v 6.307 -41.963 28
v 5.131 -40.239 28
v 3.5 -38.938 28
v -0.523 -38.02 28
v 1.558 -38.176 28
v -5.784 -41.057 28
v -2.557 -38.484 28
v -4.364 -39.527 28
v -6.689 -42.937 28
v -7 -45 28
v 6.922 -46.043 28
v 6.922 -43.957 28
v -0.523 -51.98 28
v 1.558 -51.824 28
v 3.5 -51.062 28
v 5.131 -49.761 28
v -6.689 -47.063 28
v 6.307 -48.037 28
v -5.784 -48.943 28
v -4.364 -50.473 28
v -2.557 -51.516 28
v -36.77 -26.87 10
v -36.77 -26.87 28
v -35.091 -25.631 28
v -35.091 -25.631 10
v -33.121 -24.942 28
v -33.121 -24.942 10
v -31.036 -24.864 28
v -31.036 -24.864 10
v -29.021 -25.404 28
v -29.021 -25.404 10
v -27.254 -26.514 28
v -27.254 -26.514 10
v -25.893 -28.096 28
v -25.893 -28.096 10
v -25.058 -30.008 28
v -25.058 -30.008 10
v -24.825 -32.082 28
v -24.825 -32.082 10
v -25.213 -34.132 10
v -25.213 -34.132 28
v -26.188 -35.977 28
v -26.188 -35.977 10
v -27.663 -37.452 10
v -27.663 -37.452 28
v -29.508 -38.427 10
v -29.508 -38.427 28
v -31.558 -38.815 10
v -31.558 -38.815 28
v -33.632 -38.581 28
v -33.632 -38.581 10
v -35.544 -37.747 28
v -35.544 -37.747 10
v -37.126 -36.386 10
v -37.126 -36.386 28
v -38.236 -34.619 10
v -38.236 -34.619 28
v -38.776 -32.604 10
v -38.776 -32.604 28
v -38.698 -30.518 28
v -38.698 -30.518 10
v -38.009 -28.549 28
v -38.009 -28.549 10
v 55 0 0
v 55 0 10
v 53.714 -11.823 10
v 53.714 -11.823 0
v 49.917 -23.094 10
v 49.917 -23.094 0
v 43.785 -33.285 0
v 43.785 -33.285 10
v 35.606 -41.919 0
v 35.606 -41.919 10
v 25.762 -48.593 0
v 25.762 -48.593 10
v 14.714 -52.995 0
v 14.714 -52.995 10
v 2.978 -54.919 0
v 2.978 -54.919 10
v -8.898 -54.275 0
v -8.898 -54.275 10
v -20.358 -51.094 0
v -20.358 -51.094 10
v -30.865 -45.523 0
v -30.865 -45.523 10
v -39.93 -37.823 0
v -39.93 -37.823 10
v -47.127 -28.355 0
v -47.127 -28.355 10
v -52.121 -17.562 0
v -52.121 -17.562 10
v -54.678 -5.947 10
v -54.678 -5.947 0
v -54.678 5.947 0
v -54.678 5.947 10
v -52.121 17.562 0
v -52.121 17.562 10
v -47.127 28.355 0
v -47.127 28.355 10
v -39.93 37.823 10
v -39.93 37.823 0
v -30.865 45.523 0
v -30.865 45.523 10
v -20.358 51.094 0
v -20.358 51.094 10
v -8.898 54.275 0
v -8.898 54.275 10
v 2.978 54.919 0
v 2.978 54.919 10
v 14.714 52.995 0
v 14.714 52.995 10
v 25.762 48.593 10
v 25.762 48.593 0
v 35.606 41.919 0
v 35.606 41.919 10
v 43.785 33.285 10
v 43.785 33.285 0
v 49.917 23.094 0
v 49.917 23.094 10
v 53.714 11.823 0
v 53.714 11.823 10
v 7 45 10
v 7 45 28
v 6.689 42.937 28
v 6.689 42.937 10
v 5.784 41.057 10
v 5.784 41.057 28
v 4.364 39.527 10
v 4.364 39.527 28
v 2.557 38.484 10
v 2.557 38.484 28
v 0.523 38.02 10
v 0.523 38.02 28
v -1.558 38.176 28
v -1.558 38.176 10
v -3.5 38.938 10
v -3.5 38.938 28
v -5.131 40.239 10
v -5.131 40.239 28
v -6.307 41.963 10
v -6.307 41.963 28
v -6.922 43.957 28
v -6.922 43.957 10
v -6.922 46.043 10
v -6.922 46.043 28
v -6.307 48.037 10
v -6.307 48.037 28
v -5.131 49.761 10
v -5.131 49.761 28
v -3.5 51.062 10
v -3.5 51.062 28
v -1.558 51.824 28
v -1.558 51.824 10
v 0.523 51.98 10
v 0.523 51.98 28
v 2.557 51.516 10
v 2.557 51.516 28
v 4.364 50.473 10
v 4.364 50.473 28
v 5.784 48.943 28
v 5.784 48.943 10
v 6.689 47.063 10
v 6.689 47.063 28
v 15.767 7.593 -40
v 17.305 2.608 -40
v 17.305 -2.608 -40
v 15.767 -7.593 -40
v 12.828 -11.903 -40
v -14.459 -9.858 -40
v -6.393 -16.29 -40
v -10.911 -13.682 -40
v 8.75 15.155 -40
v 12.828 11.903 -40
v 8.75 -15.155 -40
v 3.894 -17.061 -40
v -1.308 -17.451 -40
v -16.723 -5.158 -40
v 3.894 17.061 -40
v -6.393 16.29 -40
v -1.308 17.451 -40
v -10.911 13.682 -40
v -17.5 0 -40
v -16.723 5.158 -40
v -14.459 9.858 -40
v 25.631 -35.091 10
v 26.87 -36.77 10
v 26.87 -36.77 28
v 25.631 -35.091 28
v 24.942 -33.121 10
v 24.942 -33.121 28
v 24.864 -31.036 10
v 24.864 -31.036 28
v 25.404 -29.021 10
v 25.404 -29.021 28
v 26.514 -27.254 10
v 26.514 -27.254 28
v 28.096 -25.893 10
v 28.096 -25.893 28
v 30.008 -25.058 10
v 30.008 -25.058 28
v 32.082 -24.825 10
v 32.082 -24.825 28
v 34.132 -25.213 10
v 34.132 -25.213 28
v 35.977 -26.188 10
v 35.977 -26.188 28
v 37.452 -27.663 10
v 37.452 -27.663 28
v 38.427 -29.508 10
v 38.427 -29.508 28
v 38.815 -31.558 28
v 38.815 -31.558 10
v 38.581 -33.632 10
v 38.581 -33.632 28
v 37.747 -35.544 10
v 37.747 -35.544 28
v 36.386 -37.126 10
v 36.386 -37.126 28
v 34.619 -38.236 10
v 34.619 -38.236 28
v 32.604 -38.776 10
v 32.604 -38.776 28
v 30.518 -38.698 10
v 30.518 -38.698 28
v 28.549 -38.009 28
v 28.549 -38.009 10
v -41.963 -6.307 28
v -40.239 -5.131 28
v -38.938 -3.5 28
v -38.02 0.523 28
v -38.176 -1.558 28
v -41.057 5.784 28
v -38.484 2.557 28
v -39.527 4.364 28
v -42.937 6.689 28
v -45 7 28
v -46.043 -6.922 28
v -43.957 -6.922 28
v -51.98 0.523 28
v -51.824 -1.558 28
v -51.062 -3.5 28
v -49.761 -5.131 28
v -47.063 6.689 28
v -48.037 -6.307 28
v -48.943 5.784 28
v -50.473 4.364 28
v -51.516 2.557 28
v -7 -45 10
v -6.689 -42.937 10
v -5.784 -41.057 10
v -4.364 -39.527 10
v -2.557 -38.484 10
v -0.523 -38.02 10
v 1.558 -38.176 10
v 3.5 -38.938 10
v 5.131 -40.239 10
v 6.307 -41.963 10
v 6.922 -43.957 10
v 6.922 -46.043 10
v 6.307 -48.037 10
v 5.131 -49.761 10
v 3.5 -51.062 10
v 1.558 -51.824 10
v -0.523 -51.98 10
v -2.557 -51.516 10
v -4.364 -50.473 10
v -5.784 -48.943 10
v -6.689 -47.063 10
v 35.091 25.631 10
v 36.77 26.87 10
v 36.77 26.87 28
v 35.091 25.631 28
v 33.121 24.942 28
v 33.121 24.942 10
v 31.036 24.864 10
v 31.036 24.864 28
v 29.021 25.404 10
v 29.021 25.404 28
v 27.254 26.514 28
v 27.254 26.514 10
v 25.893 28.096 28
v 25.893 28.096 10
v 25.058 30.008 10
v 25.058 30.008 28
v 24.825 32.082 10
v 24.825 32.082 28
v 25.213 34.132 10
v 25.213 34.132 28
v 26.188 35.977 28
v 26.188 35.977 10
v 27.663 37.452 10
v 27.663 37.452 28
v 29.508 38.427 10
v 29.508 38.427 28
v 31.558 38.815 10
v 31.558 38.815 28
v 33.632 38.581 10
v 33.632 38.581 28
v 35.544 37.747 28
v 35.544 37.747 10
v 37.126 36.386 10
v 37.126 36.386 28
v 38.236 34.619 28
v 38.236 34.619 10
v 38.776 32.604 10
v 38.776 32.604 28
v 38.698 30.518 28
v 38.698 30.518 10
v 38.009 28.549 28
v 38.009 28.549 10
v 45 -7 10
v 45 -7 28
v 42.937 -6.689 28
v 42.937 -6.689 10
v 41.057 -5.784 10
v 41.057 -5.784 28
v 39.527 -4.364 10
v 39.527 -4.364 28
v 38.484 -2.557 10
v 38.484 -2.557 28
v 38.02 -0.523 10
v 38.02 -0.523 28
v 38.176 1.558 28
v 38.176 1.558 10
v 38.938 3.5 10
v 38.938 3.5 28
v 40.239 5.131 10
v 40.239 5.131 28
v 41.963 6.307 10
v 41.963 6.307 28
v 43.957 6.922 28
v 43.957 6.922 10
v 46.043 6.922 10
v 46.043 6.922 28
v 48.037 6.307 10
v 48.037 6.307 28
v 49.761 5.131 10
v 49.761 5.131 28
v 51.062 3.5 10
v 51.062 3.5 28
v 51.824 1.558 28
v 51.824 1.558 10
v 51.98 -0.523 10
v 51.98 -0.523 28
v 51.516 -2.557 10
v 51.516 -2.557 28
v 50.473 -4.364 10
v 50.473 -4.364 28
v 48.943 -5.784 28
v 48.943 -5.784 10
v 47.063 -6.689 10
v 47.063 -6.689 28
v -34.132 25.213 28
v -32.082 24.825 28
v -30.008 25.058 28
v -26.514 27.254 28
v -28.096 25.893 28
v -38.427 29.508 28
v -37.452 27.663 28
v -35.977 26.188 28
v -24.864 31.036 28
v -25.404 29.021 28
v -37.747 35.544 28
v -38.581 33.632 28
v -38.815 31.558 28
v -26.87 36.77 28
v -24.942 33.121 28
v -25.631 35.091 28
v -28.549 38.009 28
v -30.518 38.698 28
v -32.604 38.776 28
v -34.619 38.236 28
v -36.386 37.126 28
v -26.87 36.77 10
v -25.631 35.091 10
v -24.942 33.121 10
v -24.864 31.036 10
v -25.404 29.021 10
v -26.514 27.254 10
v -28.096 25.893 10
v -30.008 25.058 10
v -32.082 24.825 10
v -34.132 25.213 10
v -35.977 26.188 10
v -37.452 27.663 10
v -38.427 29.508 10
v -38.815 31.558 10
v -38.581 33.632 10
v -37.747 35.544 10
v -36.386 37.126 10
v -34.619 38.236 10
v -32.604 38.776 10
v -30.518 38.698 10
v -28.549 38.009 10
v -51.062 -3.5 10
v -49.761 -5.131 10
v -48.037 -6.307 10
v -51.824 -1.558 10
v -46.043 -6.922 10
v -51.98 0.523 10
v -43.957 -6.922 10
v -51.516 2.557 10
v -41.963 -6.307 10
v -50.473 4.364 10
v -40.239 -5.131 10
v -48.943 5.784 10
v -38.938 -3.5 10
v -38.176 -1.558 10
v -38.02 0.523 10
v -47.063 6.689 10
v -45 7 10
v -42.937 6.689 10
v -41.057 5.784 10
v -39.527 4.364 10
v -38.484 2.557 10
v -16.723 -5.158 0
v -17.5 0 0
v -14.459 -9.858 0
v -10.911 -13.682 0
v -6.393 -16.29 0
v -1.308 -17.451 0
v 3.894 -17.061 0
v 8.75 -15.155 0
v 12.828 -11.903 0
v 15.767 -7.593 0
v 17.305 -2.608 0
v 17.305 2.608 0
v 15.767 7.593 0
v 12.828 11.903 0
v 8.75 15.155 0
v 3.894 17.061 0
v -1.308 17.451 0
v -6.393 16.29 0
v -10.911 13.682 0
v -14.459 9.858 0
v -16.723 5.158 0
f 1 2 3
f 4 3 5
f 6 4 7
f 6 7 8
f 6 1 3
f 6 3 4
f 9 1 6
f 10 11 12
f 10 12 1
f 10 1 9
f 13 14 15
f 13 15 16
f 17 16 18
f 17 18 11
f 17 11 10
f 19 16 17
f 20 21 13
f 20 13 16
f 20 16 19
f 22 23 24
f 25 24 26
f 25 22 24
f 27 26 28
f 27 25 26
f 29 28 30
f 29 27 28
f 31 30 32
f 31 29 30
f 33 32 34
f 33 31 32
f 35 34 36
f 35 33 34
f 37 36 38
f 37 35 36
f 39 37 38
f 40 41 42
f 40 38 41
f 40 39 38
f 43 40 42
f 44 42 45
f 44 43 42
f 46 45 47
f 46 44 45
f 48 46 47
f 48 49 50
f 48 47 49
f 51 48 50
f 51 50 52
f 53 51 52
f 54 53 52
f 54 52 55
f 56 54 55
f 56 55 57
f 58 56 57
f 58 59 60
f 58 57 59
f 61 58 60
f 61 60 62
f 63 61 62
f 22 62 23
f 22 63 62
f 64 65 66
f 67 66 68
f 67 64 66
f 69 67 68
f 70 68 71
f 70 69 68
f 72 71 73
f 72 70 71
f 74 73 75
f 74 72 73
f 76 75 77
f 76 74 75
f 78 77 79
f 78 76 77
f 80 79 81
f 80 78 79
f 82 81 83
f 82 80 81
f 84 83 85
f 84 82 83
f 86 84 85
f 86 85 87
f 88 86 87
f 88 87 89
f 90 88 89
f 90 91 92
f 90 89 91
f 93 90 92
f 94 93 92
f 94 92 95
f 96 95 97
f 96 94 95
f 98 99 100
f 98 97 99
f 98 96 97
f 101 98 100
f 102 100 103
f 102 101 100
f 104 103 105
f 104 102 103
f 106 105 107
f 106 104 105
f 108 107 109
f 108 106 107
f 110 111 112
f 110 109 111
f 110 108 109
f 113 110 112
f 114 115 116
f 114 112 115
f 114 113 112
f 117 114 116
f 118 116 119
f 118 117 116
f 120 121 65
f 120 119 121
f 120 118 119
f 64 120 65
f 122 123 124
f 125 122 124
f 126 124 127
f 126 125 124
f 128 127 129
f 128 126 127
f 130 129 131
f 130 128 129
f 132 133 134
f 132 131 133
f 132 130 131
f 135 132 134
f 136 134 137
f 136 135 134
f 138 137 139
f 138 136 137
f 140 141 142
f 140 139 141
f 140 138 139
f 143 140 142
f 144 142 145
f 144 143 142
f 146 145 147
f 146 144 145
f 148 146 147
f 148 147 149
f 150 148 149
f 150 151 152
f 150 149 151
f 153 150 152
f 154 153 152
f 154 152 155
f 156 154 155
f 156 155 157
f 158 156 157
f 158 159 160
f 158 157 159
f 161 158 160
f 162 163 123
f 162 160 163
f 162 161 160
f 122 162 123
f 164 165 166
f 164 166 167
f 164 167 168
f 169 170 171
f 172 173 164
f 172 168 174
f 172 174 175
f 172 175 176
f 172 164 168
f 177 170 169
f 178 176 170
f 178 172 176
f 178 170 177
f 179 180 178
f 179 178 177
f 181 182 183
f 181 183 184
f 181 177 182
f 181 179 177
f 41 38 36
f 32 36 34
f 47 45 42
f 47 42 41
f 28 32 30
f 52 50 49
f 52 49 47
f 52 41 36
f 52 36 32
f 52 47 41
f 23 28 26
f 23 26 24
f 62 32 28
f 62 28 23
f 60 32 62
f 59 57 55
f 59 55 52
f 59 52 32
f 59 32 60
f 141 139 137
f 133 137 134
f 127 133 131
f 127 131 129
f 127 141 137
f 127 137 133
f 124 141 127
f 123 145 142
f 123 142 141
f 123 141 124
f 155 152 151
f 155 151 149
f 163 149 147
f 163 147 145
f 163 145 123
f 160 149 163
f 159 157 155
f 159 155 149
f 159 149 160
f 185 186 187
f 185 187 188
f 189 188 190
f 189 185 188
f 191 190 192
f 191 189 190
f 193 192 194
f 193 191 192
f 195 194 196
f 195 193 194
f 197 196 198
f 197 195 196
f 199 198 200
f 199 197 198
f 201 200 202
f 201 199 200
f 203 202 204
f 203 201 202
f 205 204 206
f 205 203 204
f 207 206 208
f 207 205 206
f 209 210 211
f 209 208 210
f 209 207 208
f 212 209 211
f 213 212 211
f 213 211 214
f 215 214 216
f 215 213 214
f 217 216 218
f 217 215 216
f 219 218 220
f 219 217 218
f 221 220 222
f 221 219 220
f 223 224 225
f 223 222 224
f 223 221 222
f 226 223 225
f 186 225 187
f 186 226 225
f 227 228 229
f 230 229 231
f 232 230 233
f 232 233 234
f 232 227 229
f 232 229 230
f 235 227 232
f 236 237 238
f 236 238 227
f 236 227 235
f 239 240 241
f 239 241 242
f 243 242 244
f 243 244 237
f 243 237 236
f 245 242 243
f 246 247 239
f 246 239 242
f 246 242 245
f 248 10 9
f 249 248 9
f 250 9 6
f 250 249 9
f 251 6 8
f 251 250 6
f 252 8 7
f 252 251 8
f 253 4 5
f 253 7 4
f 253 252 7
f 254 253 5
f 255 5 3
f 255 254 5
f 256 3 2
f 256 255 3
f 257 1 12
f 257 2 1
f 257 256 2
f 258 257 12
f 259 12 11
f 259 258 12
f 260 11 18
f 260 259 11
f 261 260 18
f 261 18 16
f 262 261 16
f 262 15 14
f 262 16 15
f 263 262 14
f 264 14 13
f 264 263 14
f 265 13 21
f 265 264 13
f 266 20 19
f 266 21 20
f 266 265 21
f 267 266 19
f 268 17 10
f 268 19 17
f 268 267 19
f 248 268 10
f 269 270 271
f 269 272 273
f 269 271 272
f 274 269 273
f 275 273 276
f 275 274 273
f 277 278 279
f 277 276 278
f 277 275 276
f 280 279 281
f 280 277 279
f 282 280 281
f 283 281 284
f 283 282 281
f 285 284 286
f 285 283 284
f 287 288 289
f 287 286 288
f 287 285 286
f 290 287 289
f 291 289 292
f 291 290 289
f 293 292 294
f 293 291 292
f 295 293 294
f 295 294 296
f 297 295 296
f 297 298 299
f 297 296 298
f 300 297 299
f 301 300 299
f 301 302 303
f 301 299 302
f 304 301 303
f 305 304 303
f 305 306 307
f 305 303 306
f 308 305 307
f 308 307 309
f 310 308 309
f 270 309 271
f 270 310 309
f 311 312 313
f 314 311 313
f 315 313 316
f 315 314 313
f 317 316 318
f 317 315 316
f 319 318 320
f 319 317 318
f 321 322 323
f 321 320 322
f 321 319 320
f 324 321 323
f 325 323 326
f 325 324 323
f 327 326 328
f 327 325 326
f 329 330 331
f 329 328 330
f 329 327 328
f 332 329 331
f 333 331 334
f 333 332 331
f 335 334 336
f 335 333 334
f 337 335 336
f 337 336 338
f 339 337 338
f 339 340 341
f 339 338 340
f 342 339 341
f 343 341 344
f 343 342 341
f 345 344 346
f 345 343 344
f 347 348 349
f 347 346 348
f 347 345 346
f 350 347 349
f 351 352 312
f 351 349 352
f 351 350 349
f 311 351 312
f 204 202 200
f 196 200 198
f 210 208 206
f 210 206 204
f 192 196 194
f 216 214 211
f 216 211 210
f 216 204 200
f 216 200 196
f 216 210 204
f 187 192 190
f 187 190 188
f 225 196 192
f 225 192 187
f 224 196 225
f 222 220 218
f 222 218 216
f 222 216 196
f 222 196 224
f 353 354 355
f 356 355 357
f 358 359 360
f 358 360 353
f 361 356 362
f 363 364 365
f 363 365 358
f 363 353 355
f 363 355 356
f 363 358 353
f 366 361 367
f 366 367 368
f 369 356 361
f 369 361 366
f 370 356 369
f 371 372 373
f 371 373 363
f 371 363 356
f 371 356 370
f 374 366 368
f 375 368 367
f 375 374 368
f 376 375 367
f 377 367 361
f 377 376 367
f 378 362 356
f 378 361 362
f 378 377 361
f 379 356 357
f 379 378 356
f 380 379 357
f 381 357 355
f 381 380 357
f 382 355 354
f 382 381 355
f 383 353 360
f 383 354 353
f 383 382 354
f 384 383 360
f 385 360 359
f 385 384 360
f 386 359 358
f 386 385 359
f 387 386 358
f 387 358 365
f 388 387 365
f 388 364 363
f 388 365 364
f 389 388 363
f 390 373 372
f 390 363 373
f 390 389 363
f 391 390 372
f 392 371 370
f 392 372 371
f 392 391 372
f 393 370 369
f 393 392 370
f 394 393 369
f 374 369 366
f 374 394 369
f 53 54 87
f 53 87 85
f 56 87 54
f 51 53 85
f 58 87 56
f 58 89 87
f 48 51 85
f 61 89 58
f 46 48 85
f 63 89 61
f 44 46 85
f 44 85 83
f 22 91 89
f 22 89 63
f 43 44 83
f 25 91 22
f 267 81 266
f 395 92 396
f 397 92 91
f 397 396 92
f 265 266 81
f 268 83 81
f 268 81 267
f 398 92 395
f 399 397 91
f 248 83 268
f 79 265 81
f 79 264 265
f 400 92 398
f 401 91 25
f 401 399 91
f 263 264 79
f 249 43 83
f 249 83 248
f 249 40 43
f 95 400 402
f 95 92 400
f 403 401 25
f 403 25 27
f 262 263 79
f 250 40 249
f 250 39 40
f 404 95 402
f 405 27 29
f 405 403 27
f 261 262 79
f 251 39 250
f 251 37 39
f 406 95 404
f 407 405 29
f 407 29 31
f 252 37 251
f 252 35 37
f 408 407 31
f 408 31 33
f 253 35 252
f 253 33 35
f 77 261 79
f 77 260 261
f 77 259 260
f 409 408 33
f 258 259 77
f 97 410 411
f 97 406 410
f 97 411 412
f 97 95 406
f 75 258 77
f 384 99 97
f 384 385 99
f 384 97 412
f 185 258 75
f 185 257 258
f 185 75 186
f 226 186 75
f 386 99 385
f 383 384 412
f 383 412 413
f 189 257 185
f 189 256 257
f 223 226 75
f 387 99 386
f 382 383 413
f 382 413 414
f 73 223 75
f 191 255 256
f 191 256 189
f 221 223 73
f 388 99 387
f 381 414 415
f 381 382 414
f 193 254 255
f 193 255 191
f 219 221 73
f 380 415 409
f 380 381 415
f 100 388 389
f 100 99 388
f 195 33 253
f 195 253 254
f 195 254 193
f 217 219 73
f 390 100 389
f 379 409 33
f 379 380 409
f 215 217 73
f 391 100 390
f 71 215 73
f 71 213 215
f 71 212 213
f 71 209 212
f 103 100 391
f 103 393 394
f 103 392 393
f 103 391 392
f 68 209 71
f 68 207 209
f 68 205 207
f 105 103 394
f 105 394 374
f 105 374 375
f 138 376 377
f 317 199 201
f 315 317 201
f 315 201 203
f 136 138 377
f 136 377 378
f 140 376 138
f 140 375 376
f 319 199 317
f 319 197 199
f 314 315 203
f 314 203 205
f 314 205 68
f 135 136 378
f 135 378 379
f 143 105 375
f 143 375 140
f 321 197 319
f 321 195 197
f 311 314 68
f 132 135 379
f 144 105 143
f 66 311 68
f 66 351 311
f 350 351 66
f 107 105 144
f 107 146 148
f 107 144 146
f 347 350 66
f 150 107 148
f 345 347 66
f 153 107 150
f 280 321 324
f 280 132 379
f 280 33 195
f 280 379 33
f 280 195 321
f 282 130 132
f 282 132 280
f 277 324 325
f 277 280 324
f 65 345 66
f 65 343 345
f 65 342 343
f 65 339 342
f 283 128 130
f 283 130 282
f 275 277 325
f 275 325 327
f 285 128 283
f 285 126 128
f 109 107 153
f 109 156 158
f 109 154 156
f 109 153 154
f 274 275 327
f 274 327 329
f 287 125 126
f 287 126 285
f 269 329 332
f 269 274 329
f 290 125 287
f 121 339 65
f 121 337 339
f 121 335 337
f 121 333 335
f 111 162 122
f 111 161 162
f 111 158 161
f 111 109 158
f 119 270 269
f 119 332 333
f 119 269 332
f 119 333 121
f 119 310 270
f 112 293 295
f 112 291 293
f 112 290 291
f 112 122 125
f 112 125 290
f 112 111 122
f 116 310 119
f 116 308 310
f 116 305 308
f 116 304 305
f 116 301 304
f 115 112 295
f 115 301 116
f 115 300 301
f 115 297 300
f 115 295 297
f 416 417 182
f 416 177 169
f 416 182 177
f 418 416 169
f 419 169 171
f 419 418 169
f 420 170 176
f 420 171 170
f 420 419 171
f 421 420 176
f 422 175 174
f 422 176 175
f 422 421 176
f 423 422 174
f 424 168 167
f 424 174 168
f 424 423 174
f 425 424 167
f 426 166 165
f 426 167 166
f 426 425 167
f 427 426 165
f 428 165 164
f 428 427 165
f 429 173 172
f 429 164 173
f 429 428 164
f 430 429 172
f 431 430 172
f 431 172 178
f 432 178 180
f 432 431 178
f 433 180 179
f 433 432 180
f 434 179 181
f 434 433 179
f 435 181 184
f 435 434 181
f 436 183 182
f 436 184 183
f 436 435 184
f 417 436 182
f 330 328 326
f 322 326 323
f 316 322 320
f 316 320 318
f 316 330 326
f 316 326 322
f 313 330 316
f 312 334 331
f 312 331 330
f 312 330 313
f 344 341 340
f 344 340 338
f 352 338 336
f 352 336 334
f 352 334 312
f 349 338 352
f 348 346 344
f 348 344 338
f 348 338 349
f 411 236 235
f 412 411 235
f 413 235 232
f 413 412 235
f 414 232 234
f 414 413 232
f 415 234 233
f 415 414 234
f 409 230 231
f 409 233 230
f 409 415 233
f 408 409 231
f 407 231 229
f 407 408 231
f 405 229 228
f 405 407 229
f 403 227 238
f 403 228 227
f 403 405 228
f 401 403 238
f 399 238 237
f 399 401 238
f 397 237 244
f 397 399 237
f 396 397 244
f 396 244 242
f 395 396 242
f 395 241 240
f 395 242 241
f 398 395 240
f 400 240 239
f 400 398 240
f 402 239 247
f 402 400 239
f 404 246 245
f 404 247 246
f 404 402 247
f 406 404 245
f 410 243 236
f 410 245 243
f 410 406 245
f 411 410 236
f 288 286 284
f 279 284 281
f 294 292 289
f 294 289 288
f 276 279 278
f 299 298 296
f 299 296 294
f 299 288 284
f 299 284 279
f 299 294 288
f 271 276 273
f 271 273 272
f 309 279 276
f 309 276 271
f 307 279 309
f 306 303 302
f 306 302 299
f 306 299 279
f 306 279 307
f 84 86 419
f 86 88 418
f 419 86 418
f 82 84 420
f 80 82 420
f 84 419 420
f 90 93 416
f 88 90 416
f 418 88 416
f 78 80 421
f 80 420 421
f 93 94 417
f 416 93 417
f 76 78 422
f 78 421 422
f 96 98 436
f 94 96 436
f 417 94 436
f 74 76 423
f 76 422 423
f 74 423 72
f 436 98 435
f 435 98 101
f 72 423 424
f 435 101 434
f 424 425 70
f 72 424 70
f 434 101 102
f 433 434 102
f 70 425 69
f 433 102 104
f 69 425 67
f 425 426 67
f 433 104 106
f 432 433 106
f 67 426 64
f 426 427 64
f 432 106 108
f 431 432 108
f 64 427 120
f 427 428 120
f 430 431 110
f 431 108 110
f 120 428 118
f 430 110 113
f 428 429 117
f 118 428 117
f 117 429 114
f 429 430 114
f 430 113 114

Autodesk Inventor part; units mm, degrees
ref_plane "YZ Plane" through (0, 0, 0) normal (1, 0, 0) x (0, 1, 0)
ref_plane "XZ Plane" through (0, 0, 0) normal (0, 1, 0) x (-1, 0, 0)
ref_plane "XY Plane" through (0, 0, 0) normal (0, 0, 1) x (1, 0, 0)
sketch "스케치1" plane through (0, 0, 0) normal (0, 0, 1) x (1, 0, 0)
  circle A0 centre (0, 0) radius 55
  dimension "d0" = 110
extrude "돌출1" add sketch "스케치1" along normal blind 10
sketch "스케치2" plane through (0, 0, 10) normal (0, 0, 1) x (1, 0, 0)
  circle A0 centre (0, 0) radius 45 construction
  line L0 (0, 0) -> (0, 45) construction
  circle A1 centre (0, 45) radius 7
  dimension "d3" = 90
  dimension "d4" = 14
extrude "돌출2" add sketch "스케치2" along normal blind 18
pattern_circular "원형 패턴1" count 8 over 360 about axis through (0, 0, 0) along (0, 0, 1) of "돌출2"
sketch "스케치3" plane through (0, 0, 0) normal (0, 0, -1) x (-1, 0, 0)
  circle A0 centre (0, 0) radius 17.5
  dimension "d10" = 35
extrude "돌출3" add sketch "스케치3" along normal blind 40
properties part number "out_shaft"
